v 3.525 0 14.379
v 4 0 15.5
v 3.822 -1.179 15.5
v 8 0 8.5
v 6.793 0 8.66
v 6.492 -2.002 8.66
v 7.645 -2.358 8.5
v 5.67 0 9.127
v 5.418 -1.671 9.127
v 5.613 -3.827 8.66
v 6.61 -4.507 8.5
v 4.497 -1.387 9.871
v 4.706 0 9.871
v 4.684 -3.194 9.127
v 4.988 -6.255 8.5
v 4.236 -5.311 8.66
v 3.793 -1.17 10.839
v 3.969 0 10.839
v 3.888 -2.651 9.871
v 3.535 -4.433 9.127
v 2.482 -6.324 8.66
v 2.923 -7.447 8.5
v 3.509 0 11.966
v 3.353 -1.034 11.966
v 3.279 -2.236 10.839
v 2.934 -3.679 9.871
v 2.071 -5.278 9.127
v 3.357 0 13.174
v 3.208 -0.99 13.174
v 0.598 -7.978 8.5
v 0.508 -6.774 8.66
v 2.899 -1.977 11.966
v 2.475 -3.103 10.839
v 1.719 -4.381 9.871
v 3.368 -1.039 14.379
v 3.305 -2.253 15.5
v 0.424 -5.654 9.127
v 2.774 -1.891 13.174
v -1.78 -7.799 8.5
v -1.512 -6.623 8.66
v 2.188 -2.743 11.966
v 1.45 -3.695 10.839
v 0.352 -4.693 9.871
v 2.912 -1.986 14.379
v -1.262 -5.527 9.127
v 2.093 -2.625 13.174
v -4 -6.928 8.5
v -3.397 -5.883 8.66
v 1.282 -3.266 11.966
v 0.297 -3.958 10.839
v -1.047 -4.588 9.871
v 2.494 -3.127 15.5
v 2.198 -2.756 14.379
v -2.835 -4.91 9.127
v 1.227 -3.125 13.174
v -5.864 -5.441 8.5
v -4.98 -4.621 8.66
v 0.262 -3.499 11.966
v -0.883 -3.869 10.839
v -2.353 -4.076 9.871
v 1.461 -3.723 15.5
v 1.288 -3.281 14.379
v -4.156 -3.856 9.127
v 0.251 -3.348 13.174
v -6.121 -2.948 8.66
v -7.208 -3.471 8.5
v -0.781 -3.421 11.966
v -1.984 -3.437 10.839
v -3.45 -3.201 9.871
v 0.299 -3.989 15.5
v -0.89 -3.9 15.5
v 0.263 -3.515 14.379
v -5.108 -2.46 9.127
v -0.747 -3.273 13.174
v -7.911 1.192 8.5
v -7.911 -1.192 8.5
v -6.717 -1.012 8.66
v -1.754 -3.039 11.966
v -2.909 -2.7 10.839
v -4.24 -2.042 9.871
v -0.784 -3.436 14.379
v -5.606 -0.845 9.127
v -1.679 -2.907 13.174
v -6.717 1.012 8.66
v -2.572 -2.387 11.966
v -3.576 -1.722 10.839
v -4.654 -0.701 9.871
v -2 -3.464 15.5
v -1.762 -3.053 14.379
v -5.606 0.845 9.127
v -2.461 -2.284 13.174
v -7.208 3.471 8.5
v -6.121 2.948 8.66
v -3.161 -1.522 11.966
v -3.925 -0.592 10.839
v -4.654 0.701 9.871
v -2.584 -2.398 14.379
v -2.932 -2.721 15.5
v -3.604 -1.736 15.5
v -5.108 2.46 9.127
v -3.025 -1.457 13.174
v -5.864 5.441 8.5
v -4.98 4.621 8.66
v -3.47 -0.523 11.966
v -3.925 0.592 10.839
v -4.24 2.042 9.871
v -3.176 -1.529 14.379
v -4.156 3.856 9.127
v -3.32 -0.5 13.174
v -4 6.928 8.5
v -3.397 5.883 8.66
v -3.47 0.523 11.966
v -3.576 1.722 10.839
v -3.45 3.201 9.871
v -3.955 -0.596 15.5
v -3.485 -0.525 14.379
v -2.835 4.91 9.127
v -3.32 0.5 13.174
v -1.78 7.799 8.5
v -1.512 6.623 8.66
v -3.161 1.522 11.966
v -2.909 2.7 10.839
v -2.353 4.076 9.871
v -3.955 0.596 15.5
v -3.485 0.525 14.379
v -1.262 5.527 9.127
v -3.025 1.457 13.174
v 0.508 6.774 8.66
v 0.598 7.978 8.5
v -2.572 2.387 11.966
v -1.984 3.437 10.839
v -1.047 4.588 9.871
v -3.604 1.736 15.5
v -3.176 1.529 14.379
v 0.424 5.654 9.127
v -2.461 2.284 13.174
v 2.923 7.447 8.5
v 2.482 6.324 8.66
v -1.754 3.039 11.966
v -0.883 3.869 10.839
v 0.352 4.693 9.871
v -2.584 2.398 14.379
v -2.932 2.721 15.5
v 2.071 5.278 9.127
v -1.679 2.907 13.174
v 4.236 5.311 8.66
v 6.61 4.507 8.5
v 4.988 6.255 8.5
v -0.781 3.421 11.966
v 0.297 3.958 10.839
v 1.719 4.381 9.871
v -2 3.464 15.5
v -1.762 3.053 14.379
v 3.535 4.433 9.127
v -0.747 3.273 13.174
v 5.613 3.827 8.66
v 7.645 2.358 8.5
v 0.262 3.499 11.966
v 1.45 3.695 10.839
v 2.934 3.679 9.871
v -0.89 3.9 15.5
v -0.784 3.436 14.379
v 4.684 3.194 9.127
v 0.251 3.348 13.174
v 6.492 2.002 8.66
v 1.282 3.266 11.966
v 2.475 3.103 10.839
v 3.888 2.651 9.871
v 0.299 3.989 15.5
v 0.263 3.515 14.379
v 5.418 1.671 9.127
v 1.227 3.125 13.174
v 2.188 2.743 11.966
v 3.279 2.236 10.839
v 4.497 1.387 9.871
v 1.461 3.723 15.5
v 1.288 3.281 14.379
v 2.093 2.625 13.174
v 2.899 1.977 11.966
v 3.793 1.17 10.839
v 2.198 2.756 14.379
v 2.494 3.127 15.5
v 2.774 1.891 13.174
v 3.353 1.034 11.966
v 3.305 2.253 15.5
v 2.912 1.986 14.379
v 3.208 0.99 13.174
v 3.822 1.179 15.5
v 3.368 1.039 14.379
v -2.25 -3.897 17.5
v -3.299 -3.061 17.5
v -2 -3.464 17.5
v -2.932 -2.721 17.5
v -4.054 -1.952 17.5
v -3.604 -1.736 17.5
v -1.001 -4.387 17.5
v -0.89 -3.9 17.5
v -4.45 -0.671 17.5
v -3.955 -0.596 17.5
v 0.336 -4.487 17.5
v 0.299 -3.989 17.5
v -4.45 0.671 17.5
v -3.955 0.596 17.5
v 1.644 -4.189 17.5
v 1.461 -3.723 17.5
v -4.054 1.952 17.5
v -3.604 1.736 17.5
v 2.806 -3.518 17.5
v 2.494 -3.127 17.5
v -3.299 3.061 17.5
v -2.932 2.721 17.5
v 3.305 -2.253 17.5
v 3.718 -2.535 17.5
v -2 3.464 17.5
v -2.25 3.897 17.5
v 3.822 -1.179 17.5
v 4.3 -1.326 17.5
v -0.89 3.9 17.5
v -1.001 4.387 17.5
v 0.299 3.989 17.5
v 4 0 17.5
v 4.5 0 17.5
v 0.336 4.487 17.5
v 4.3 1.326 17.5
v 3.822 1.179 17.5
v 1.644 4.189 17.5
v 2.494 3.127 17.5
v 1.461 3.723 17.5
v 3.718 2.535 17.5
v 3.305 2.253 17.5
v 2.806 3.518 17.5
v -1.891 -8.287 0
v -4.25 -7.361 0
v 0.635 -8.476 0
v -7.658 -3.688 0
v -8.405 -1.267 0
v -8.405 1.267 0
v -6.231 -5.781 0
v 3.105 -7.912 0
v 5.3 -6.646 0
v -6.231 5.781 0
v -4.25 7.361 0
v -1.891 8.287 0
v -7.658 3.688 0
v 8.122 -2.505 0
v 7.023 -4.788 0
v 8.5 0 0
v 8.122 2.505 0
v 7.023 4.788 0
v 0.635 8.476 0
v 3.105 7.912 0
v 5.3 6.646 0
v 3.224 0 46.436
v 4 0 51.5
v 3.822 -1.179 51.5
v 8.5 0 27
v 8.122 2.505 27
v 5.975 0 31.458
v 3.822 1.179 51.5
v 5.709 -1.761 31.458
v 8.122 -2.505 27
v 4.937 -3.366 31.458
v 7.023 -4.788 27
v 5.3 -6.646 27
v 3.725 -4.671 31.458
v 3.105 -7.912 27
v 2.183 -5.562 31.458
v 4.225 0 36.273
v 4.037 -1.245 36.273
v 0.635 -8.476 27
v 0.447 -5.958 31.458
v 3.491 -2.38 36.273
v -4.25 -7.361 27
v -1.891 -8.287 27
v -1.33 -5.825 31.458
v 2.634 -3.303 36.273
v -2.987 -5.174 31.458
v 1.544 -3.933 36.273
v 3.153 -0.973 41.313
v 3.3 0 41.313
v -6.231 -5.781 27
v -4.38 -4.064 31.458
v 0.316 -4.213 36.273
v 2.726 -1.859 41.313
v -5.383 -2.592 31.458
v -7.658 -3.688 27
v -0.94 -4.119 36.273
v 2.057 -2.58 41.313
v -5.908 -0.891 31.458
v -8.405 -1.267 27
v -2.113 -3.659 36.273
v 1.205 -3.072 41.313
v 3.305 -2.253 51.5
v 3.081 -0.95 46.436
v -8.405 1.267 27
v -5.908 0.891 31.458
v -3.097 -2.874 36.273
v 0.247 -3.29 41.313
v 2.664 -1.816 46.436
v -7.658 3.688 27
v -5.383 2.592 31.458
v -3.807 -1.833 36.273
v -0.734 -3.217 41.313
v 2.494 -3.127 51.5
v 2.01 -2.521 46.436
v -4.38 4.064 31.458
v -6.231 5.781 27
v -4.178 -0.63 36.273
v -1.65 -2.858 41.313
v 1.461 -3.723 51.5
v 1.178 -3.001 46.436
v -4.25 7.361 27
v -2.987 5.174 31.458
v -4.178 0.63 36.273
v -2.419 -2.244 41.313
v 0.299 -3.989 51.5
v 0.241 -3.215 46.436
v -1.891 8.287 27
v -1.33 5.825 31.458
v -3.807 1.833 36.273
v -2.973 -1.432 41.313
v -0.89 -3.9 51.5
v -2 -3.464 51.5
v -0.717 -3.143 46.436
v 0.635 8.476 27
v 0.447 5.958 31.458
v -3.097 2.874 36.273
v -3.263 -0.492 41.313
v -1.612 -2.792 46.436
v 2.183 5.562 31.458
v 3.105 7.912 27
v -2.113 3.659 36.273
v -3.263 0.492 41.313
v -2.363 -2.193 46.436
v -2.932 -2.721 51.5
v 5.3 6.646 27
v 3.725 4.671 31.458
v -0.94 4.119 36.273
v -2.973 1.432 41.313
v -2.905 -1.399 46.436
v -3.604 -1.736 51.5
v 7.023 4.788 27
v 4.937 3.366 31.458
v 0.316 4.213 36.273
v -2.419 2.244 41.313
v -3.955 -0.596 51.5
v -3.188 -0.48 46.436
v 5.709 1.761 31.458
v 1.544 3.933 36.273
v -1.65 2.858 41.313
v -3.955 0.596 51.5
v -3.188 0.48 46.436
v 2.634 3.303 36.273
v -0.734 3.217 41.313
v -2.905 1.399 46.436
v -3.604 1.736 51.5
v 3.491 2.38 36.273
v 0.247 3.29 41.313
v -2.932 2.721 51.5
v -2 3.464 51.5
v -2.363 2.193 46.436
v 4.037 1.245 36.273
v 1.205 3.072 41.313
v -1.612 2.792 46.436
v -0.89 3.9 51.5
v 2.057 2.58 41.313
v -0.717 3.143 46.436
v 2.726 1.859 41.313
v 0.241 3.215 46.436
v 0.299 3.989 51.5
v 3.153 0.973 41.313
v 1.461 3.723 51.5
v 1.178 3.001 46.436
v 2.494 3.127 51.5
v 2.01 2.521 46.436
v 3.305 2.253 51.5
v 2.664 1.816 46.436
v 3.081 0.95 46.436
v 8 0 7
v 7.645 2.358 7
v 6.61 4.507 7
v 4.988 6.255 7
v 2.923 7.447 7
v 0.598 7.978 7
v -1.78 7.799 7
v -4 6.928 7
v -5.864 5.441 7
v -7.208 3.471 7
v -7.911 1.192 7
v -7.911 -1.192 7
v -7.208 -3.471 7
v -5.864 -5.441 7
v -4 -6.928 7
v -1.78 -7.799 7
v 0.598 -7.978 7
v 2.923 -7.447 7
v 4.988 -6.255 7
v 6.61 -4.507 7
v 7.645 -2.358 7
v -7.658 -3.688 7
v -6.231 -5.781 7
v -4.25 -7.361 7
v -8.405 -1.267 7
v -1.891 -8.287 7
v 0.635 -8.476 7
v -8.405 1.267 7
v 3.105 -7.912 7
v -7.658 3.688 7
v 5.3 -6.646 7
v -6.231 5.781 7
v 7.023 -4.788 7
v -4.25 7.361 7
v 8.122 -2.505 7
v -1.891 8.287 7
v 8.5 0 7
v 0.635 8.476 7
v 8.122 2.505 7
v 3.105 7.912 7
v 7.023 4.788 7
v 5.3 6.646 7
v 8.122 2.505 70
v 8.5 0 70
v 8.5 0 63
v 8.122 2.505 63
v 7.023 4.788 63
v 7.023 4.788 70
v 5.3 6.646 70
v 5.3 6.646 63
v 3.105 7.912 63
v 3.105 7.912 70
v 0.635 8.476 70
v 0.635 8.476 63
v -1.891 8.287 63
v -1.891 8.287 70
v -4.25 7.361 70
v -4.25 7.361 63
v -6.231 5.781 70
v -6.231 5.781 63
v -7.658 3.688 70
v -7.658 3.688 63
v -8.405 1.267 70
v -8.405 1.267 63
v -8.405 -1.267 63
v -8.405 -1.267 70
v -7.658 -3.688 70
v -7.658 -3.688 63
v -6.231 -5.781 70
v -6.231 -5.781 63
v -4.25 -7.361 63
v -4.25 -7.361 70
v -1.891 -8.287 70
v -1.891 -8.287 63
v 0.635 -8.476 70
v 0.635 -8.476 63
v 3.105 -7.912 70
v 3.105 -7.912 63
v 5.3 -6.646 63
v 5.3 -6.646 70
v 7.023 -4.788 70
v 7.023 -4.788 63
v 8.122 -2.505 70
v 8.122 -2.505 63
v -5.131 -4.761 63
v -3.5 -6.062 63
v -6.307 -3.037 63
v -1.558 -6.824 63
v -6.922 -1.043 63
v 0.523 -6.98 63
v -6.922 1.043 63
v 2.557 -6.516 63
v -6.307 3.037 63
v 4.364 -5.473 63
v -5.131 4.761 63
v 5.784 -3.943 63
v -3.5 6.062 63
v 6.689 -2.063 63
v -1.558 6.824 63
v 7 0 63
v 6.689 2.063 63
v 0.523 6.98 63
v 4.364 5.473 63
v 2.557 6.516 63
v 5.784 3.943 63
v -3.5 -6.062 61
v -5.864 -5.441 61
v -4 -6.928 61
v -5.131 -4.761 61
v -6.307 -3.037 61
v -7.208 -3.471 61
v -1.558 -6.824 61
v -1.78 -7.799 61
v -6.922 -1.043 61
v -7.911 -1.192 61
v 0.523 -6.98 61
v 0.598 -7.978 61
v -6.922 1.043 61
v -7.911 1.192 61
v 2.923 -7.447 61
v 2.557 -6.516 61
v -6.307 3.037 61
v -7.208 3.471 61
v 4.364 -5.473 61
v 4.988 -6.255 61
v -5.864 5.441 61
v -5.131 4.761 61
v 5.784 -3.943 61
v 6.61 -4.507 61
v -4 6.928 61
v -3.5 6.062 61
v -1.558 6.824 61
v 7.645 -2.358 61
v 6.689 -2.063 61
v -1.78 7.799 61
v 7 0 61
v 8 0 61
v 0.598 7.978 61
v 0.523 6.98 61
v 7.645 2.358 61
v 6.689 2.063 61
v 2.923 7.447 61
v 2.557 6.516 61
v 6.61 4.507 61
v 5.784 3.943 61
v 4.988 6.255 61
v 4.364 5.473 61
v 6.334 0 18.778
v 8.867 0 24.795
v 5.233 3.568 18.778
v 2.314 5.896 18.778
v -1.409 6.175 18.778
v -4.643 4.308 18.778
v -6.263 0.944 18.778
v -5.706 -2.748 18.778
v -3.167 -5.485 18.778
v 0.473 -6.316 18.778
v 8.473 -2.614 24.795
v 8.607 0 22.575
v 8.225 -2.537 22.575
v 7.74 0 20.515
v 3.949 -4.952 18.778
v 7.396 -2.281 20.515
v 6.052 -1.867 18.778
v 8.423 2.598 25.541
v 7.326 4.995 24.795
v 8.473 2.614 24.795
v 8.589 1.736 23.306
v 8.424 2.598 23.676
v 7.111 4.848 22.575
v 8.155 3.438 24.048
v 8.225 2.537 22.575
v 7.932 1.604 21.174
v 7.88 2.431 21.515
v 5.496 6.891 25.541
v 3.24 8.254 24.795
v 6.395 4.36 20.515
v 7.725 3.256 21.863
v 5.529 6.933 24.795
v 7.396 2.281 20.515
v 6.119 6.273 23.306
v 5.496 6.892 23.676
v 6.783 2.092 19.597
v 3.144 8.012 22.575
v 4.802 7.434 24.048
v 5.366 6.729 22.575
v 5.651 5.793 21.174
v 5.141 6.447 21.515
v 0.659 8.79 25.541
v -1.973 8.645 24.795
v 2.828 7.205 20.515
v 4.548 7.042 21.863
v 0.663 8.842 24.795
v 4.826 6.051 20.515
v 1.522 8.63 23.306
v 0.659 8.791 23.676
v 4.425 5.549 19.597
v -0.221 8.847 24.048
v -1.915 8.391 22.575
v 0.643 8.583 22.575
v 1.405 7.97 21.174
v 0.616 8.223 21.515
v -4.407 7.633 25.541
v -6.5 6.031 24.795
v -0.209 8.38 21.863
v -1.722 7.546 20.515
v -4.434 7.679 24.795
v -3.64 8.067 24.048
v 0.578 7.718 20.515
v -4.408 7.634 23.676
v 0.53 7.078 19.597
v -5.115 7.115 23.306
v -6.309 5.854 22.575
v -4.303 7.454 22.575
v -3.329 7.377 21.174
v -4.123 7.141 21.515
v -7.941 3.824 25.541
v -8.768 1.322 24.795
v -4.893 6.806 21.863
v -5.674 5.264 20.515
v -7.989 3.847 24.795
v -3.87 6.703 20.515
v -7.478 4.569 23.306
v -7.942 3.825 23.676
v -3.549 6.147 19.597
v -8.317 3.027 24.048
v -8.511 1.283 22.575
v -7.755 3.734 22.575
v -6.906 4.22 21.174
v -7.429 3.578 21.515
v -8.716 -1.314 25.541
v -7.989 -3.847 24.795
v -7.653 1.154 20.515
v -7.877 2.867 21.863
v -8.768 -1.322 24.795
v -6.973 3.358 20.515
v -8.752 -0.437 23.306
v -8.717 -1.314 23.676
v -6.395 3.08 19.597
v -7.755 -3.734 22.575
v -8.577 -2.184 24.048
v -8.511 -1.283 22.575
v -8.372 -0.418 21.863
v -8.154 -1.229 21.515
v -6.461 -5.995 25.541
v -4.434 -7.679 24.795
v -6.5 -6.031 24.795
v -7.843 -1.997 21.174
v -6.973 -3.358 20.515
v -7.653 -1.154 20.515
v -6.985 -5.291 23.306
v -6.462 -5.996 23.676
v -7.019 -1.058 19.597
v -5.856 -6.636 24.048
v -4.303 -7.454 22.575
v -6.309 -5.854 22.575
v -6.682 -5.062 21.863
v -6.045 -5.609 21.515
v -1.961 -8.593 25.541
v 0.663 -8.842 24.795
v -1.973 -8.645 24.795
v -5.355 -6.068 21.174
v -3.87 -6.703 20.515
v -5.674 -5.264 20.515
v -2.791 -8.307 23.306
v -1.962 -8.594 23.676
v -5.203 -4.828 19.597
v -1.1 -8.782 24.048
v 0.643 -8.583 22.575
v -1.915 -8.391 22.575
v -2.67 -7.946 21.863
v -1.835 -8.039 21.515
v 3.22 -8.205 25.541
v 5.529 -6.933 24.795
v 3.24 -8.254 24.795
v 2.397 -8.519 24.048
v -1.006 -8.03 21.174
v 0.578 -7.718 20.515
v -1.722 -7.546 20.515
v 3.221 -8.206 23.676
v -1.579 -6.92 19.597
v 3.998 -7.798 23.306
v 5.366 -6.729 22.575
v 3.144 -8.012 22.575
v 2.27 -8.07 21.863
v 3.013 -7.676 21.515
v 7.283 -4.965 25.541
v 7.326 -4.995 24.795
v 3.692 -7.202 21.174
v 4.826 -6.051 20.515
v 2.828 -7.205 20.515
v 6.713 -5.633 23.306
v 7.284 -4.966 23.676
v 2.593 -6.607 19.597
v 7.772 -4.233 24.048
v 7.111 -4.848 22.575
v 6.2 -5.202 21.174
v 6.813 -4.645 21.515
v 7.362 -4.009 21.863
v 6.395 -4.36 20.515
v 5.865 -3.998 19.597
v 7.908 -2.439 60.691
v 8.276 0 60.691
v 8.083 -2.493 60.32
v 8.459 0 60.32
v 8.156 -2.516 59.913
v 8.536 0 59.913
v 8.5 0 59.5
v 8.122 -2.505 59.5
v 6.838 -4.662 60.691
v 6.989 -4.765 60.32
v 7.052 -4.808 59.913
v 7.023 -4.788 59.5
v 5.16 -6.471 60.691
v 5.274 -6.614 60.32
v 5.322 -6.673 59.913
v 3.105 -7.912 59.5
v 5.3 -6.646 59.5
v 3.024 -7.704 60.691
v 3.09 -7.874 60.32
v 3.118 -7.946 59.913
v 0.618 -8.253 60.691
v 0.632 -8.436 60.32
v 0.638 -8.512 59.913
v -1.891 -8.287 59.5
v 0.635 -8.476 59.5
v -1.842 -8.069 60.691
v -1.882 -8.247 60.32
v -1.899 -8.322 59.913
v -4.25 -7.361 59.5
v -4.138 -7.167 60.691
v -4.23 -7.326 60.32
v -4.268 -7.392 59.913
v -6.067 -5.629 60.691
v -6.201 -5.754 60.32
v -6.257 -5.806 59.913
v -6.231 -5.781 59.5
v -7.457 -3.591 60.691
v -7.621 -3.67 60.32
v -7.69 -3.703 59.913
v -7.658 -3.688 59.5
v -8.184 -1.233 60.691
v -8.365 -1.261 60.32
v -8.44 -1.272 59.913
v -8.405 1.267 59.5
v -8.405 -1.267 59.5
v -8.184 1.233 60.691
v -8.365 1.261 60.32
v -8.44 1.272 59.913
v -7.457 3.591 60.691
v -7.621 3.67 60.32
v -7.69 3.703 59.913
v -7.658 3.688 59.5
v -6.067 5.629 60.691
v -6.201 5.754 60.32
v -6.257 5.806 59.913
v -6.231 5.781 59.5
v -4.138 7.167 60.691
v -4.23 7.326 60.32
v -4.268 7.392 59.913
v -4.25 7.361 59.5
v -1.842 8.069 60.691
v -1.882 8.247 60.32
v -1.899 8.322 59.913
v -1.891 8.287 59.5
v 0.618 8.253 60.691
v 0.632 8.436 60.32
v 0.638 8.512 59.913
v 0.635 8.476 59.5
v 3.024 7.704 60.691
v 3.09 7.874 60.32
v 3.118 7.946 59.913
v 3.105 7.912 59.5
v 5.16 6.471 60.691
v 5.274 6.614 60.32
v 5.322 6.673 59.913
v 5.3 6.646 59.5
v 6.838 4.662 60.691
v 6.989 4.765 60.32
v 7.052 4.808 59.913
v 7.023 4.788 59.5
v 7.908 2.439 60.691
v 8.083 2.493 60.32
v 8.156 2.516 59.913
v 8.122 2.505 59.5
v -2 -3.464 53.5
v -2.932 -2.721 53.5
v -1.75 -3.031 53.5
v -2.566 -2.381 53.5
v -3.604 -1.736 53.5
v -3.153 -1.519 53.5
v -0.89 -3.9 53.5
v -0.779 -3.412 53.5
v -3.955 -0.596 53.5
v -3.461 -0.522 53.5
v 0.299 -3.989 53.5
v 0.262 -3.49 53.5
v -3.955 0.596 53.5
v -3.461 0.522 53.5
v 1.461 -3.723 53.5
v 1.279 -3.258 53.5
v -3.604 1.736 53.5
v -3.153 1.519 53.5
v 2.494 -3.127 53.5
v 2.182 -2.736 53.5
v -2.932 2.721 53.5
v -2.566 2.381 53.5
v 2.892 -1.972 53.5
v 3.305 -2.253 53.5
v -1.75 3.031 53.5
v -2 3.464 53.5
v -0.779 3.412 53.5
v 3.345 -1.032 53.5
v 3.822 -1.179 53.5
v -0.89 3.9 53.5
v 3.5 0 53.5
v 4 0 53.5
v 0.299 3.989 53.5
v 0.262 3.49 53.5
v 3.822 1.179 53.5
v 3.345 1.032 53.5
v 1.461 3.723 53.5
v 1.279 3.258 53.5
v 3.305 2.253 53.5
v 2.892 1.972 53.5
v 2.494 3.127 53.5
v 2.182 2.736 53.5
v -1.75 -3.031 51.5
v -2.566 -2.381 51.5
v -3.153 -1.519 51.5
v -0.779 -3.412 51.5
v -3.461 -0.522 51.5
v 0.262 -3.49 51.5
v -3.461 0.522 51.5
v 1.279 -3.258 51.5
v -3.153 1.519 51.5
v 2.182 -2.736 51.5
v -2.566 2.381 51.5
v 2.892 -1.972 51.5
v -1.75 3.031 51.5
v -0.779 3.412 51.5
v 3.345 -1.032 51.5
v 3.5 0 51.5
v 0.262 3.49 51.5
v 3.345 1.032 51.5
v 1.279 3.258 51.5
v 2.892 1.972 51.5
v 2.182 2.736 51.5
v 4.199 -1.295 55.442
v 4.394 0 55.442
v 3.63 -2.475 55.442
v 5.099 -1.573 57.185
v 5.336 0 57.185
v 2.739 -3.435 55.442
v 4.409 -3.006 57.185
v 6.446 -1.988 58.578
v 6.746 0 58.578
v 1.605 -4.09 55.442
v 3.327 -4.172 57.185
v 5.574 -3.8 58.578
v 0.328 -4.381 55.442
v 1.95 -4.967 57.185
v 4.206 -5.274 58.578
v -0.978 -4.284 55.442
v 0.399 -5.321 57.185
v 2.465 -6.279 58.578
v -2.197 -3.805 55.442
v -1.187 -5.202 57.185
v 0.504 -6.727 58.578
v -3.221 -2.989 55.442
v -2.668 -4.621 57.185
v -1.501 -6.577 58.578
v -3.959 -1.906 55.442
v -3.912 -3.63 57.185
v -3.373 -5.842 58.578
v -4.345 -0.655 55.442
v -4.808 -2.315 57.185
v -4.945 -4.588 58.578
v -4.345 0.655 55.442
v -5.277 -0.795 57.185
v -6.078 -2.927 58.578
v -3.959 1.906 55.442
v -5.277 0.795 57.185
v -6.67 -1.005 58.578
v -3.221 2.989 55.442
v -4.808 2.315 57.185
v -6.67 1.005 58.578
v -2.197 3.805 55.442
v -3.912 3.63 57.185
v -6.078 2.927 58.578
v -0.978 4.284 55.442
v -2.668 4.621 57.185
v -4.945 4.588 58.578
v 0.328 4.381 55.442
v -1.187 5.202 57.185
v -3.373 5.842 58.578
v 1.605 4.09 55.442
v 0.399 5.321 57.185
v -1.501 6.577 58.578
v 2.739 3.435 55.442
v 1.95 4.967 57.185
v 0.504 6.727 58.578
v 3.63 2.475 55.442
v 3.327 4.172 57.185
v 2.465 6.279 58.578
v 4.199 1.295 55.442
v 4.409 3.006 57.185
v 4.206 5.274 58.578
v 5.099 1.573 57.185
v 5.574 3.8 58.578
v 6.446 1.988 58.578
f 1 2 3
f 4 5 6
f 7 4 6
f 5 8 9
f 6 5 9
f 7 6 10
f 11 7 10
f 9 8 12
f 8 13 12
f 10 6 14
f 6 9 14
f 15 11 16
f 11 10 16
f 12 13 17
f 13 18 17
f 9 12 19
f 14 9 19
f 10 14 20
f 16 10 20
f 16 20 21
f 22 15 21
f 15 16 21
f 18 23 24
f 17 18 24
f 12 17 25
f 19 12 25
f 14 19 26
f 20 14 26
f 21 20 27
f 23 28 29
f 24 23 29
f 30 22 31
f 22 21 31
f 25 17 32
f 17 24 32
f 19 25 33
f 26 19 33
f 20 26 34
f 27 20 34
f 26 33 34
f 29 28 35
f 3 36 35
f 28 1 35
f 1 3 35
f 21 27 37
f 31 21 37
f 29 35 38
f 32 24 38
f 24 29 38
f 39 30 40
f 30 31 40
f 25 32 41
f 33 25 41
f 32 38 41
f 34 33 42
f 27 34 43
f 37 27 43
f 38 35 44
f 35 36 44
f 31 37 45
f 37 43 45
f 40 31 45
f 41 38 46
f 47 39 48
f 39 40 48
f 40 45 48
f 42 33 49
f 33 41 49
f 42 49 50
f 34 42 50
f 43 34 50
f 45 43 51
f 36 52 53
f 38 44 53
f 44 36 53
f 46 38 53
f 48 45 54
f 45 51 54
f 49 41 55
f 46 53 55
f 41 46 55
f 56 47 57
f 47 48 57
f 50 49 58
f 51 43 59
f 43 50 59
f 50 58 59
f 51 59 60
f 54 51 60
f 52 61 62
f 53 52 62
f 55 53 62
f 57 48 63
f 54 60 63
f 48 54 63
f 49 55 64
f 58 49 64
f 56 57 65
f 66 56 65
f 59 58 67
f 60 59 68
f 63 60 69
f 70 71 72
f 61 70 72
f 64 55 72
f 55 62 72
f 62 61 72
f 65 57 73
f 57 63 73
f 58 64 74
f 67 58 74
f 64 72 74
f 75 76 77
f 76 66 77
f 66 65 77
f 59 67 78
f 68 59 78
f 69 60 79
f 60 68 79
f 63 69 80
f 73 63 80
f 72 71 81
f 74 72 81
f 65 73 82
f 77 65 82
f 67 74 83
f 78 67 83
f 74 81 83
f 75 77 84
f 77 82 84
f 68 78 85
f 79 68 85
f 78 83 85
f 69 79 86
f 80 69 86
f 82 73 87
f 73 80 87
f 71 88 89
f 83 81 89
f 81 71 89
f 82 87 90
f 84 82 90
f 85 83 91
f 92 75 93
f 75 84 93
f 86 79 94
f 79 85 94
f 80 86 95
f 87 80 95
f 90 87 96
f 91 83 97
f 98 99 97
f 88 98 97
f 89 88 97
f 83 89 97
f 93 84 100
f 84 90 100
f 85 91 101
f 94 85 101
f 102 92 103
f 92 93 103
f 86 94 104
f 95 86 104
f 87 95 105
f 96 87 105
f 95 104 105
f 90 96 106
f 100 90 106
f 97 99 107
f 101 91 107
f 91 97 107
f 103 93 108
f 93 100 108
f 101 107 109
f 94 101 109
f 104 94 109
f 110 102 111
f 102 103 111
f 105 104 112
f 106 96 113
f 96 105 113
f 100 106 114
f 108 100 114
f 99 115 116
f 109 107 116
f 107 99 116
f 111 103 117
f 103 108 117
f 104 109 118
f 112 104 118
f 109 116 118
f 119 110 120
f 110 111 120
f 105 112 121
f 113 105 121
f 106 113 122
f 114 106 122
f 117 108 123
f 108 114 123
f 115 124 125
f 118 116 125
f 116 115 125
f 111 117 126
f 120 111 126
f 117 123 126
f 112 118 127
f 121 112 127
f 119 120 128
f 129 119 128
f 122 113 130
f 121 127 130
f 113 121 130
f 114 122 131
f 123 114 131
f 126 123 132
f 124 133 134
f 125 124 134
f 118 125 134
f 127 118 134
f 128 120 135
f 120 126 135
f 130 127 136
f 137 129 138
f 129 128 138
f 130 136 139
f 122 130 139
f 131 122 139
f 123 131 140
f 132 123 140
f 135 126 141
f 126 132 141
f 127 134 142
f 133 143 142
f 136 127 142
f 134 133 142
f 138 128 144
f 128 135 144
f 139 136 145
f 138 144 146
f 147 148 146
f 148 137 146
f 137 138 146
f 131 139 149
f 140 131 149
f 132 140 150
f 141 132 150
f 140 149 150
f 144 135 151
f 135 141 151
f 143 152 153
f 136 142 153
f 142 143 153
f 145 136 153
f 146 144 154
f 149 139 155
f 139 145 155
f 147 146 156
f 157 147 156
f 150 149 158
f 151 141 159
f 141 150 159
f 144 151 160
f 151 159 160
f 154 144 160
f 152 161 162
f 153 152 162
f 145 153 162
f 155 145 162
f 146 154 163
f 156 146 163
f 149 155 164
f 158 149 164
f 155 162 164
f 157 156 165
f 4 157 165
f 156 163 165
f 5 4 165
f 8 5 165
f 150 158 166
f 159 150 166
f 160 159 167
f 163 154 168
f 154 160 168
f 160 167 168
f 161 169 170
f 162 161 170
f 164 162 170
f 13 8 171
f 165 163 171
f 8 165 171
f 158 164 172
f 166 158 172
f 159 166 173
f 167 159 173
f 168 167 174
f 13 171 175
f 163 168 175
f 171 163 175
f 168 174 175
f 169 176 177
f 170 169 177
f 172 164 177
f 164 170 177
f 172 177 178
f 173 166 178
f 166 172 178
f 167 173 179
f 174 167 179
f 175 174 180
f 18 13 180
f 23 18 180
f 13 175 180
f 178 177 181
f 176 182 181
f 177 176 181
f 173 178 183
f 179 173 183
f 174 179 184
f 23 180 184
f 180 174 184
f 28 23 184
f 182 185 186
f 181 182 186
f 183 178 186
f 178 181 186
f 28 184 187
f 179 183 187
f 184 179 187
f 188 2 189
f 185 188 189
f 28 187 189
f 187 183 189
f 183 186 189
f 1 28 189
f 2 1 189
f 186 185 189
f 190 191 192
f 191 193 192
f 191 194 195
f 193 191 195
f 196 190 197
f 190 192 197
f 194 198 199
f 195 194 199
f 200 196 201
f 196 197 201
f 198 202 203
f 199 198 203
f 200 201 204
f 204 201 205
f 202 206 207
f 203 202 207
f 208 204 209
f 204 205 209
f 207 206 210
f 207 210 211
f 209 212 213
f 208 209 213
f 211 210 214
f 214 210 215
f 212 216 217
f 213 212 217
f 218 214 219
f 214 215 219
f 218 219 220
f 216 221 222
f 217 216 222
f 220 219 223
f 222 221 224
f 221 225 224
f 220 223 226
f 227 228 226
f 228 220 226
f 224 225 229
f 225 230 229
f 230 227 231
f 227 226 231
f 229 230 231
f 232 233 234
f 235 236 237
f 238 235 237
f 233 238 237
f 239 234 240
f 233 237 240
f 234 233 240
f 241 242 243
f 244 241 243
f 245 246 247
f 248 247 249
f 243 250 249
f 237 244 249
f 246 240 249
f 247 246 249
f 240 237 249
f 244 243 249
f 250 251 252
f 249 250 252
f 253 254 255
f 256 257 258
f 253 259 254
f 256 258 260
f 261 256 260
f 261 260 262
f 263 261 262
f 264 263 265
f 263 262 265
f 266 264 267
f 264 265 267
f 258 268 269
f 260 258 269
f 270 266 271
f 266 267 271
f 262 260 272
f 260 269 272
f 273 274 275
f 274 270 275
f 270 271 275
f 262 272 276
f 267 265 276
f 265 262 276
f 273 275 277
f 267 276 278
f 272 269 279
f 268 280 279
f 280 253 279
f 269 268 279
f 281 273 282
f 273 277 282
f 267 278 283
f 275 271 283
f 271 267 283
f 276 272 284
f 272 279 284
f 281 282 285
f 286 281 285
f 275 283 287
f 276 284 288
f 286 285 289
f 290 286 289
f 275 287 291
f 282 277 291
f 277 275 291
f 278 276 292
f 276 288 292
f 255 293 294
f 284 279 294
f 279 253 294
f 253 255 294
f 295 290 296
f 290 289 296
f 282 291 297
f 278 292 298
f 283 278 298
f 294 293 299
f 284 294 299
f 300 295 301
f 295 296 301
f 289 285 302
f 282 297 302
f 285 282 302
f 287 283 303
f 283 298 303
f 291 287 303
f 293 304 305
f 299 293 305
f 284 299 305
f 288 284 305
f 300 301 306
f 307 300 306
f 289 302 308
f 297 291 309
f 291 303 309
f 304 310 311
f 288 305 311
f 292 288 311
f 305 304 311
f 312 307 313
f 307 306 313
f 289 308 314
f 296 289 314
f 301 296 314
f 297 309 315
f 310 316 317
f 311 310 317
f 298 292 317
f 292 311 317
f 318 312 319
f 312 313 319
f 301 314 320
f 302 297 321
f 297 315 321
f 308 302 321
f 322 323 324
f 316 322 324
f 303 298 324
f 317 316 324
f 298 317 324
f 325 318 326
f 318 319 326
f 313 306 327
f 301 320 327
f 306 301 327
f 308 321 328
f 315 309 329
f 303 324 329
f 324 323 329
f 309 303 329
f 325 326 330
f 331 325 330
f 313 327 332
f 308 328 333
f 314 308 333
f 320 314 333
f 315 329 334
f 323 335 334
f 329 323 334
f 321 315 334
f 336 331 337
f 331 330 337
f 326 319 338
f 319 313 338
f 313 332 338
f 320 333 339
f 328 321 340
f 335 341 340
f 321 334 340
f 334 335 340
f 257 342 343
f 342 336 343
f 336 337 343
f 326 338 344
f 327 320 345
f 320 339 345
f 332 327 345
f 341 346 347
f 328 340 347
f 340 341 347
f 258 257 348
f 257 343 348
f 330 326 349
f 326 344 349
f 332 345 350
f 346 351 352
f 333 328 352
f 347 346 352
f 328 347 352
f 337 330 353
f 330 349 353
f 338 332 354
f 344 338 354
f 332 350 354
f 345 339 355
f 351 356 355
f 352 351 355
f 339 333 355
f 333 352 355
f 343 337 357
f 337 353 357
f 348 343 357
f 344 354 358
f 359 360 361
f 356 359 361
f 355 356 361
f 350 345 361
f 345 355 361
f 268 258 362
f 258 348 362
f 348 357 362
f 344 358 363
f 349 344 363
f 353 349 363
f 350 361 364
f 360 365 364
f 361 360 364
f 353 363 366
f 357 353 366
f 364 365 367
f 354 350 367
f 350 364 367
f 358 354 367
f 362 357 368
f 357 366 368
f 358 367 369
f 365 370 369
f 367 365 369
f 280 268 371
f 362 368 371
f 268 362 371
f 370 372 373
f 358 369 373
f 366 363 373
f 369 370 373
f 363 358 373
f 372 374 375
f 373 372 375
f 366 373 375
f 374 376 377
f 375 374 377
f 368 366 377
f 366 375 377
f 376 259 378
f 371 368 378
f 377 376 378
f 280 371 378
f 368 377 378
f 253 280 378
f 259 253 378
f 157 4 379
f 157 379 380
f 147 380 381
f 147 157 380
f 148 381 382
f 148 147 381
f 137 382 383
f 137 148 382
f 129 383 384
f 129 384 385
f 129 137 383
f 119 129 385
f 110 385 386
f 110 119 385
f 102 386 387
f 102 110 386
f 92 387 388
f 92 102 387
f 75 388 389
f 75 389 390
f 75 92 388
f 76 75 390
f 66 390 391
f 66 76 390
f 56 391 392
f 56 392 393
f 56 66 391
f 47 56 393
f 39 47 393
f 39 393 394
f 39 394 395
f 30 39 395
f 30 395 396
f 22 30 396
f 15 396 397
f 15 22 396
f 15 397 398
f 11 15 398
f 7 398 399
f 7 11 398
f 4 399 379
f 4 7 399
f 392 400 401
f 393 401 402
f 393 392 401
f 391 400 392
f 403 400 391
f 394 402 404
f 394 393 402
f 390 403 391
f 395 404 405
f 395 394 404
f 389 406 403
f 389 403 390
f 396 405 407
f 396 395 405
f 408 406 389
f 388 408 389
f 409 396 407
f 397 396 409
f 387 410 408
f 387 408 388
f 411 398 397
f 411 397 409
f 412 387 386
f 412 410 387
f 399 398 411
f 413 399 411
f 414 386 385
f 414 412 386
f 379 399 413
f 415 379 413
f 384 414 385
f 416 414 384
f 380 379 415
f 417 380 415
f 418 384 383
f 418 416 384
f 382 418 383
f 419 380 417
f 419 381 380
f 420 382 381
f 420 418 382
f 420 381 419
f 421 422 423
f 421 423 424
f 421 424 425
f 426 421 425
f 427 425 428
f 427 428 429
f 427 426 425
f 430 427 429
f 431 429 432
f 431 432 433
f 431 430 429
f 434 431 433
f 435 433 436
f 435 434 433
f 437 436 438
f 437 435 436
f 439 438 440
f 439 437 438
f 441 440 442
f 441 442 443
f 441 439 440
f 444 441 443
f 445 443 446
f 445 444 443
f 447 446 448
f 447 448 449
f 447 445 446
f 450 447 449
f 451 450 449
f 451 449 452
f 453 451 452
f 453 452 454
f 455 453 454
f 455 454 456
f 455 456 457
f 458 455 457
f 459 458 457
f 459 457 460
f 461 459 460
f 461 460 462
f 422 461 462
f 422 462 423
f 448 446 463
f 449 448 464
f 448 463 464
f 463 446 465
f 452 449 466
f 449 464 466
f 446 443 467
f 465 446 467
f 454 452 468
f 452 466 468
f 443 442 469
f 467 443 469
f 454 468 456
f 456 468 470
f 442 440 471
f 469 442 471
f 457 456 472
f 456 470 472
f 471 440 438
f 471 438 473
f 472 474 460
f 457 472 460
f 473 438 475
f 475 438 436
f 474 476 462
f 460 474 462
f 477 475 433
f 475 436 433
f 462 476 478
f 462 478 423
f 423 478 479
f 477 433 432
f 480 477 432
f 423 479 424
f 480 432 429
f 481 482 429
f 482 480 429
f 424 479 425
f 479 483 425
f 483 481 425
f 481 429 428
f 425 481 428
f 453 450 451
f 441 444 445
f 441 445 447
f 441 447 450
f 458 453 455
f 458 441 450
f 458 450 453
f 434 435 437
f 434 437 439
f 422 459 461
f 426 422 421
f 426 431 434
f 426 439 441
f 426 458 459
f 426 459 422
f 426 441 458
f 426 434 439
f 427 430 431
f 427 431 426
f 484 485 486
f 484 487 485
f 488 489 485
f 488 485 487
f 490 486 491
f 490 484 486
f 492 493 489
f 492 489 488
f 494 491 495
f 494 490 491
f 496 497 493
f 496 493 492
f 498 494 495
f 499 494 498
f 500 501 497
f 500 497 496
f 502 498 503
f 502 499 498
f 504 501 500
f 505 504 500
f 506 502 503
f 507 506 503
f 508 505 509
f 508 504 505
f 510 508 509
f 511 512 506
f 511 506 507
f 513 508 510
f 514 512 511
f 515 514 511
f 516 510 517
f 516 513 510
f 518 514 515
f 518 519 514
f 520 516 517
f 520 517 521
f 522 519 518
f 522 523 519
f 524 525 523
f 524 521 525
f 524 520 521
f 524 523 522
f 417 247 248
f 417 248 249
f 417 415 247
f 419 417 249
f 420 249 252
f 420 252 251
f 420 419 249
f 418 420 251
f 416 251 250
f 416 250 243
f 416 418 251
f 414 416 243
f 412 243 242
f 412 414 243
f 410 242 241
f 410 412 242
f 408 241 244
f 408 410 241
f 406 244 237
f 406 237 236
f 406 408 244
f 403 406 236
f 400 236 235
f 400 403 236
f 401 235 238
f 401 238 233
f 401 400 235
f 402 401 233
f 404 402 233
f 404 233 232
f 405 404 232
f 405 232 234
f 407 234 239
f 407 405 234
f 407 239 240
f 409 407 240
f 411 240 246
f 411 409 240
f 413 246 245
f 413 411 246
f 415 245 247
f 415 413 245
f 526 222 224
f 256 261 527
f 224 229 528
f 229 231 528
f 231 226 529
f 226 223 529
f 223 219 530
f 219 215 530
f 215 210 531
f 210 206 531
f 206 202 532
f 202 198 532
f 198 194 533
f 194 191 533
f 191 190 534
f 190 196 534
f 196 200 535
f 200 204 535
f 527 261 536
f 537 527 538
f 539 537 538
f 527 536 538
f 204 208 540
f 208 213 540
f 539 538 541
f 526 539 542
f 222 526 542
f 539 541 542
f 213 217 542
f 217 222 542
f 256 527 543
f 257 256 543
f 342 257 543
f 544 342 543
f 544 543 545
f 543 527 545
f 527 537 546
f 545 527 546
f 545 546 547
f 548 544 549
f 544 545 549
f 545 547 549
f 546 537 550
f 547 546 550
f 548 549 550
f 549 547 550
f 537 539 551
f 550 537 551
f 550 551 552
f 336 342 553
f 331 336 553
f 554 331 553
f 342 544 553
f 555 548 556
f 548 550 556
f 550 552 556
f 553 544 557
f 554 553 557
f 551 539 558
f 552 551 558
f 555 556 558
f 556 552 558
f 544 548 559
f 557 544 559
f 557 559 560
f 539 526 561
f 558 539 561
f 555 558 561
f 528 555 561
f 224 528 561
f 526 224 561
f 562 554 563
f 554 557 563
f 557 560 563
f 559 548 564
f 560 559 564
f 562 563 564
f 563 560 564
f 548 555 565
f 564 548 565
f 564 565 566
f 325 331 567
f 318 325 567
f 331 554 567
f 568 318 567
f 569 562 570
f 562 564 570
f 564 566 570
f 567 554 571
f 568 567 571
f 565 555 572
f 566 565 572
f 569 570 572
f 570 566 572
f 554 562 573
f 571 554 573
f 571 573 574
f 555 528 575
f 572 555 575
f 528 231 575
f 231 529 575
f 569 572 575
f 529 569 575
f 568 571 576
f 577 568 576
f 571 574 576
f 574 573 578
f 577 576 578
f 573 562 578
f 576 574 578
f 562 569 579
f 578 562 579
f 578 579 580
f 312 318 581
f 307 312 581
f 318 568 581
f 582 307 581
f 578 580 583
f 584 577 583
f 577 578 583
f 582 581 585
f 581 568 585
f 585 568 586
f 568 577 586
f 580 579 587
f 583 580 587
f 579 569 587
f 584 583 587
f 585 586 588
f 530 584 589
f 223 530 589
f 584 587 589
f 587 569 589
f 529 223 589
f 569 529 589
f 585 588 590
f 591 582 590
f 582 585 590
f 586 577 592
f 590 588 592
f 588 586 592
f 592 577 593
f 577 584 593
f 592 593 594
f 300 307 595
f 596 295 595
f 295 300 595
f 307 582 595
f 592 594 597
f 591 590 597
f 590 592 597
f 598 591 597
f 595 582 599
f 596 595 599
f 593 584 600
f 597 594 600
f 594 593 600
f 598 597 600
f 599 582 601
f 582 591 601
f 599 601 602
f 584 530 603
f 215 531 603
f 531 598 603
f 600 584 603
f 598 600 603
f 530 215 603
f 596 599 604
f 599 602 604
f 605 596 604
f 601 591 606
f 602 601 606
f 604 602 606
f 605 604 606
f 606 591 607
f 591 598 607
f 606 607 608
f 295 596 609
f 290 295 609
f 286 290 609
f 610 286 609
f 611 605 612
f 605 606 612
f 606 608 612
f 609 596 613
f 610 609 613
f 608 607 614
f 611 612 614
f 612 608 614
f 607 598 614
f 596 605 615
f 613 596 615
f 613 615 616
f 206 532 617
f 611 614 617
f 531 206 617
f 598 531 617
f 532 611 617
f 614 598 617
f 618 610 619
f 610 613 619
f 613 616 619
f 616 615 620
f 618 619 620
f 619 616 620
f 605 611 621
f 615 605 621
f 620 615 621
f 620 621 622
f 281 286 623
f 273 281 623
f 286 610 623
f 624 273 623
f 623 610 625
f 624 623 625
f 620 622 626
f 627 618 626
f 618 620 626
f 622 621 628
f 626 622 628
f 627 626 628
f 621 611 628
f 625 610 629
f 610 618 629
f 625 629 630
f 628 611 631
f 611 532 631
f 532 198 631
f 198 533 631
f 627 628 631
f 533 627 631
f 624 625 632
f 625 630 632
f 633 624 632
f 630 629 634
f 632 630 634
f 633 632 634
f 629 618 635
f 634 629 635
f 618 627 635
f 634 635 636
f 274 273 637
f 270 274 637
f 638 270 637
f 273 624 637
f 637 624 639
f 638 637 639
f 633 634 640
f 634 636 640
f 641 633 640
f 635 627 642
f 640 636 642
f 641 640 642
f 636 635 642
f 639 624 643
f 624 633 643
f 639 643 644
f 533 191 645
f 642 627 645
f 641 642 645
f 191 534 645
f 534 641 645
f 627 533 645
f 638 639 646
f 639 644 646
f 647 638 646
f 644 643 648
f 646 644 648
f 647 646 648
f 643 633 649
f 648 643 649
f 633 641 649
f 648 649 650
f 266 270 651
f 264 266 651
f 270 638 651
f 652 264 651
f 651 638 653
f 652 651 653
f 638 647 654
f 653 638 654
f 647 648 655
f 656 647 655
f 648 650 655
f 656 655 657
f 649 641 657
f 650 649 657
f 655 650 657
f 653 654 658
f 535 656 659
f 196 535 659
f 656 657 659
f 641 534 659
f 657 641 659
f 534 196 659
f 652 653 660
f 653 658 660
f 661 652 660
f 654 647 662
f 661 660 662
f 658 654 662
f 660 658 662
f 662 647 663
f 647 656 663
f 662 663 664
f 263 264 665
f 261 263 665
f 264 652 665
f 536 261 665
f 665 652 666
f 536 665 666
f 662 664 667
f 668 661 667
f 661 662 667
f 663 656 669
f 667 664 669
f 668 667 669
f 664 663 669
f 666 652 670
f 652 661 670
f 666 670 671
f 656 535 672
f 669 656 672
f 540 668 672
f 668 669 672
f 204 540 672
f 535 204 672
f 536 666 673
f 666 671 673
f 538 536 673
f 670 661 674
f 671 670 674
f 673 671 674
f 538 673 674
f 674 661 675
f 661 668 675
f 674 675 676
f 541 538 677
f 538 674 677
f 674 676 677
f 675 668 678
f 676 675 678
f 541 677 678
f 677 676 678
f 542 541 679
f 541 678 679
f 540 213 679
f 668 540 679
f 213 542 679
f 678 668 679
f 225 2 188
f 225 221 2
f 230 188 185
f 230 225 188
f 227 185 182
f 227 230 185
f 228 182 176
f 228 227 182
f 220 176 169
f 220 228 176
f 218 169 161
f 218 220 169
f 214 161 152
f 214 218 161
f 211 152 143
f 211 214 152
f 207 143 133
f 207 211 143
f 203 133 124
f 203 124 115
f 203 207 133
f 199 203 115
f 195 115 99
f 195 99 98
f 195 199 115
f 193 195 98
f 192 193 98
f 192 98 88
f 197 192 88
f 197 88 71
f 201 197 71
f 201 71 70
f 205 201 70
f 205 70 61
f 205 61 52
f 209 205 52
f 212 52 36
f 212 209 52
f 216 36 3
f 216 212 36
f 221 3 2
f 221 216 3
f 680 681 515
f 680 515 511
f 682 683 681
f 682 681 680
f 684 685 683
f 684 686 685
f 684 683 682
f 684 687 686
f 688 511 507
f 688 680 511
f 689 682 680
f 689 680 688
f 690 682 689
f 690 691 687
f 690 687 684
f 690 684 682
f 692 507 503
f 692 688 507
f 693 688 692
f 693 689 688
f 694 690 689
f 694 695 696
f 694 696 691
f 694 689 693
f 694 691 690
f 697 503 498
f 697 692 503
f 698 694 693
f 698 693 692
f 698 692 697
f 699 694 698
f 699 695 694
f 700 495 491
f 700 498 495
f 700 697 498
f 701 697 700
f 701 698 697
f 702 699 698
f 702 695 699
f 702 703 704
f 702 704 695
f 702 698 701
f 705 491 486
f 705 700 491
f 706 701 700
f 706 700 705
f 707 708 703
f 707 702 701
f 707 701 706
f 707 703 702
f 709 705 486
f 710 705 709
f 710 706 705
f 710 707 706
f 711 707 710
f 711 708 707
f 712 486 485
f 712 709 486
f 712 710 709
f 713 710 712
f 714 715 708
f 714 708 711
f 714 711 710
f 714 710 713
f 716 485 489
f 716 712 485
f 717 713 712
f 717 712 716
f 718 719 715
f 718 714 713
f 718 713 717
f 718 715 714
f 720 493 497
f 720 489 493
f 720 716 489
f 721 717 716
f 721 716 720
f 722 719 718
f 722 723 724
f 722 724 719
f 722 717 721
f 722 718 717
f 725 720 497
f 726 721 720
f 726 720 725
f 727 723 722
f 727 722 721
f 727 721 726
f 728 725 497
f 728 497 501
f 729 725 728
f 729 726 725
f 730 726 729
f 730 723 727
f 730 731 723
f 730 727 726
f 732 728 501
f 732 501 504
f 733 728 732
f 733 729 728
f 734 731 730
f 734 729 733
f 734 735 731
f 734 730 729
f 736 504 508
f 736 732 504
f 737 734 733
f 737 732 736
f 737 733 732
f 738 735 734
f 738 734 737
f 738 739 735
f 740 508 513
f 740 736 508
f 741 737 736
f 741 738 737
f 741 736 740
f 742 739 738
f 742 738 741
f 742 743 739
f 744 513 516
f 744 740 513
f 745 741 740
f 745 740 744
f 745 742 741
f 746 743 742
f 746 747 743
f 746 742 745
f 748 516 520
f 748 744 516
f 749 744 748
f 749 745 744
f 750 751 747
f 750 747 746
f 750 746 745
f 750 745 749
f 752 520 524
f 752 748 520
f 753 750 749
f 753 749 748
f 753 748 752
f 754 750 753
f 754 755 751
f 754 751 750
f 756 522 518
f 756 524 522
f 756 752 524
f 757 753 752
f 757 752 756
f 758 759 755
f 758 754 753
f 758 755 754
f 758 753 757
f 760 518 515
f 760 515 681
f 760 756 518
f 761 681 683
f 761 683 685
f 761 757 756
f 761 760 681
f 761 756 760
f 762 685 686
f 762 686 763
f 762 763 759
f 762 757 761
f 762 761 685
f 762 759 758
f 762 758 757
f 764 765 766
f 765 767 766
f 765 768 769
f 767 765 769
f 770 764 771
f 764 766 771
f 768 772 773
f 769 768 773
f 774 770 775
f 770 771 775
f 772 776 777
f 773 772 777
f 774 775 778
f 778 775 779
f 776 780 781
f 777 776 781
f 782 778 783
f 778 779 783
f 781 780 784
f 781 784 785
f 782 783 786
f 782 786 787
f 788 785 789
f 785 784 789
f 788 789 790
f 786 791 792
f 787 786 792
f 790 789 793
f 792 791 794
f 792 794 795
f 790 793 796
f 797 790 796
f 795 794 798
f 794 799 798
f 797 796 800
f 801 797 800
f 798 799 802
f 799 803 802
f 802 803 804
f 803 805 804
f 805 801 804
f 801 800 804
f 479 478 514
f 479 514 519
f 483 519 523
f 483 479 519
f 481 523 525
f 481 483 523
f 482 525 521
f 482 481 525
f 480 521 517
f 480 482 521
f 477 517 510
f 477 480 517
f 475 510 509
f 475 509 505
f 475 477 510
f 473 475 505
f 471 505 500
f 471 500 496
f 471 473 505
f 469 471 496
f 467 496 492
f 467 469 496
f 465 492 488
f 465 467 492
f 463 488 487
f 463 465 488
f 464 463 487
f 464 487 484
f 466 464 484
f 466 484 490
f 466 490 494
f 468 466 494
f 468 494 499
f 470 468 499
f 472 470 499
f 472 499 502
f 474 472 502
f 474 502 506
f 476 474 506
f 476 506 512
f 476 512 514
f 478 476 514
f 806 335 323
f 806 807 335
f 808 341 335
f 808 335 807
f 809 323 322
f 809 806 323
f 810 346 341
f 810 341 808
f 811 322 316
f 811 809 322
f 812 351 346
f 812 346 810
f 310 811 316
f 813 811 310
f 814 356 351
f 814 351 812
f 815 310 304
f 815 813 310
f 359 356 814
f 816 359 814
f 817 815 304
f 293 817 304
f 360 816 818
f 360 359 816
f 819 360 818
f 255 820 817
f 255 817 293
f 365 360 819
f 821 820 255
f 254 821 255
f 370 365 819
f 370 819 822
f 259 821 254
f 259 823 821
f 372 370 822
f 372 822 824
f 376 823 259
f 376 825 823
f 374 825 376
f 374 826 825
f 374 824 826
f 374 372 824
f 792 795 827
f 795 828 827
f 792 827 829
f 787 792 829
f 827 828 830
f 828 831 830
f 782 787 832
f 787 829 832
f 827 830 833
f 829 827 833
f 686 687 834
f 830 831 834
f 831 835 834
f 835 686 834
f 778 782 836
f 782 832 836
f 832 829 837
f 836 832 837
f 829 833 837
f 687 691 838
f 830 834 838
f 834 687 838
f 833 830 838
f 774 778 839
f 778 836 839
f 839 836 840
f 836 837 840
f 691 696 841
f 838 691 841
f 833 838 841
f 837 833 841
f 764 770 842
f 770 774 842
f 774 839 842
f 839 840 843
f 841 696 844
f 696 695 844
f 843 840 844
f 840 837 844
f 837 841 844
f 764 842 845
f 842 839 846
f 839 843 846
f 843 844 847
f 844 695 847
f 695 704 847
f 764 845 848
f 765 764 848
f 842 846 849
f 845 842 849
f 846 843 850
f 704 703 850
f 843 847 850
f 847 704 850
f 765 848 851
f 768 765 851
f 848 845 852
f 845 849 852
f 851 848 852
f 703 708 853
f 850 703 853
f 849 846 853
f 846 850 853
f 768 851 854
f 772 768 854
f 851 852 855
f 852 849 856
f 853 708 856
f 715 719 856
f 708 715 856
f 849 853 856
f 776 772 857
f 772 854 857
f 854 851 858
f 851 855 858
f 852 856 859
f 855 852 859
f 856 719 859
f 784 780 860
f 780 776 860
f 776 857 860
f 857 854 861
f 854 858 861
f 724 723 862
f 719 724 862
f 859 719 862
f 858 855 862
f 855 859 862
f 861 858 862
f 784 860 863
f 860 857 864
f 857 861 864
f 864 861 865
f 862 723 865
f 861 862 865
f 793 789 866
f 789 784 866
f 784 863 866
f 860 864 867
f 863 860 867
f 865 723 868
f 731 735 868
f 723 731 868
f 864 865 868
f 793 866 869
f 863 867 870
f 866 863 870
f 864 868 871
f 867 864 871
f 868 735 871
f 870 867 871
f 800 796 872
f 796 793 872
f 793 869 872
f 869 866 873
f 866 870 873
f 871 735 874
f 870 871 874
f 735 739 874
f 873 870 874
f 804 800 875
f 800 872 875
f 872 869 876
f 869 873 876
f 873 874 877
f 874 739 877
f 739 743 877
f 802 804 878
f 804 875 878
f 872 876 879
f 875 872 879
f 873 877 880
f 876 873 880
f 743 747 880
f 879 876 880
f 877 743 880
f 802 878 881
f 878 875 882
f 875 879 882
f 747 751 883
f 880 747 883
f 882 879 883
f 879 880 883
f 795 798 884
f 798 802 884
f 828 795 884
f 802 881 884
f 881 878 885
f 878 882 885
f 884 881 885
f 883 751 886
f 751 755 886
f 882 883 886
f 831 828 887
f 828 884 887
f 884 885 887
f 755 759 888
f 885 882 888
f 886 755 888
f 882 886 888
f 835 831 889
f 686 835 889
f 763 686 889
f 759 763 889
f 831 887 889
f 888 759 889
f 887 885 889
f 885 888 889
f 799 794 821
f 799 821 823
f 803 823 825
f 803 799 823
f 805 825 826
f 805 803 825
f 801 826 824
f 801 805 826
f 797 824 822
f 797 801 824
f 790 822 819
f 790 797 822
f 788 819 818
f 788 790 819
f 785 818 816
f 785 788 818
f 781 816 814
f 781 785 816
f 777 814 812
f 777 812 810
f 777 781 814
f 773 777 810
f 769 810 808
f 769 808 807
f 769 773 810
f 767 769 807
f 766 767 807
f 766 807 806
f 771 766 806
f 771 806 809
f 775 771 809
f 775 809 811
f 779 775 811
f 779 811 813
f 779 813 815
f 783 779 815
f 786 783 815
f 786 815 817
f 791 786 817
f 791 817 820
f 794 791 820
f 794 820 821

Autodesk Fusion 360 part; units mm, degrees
sketch "Sketch1" plane through (0, 0, 0) normal (0, 1, 0) x (1, 0, 0)
  line L0 (0, 0) -> (8.5, 0)
  line L1 (0, 0) -> (0, -70)
  line L2 (8.5, 0) -> (8.5, -7)
  line L3 (8.5, -7) -> (8, -7)
  line L4 (8, -7) -> (8, -8.5)
  line L5 (8.5, -7) -> (0, -7)
  line L6 (8, -8.5) -> (0, -8.5)
  line L7 (0, -8.5) -> (0, -15.5)
  line L8 (0, -15.5) -> (4, -15.5)
  arc A0 (8, -8.5) -> (4, -15.5) centre (8, -13.1429) ccw
  line L9 (4, -15.5) -> (4, -17.5)
  line L10 (4, -17.5) -> (0, -17.5)
  line L11 (0, -17.5) -> (4.5, -17.5)
  line L12 (0, -17.5) -> (0, -27)
  line L13 (0, -27) -> (8.5, -27)
  arc A1 (8.5, -27) -> (4.5, -17.5) centre (0.9117, -24.603) ccw
  line L14 (0, -27) -> (0, -51.5)
  line L15 (0, -51.5) -> (4, -51.5)
  arc A2 (8.5, -27) -> (4, -51.5) centre (33.8925, -44.3272) ccw
  line L16 (0, -51.5) -> (3.5, -51.5)
  line L17 (3.5, -51.5) -> (3.5, -53.5)
  line L18 (3.5, -53.5) -> (0, -53.5)
  line L19 (0, -53.5) -> (4, -53.5)
  line L20 (0, -53.5) -> (0, -59.5)
  line L21 (0, -59.5) -> (8.5, -59.5)
  arc A3 (4, -53.5) -> (8.5, -59.5) centre (10.7181, -53.1489) ccw
  line L22 (0, -59.5) -> (0, -61)
  line L23 (0, -61) -> (8, -61)
  line L24 (0, -61) -> (7, -61)
  line L25 (7, -61) -> (7, -63)
  line L26 (7, -63) -> (0, -63)
  line L27 (0, -63) -> (8.5, -63)
  line L28 (8.5, -63) -> (8.5, -70)
  line L29 (8.5, -70) -> (0, -70)
  arc A4 (8, -61) -> (8.5, -59.5) centre (7.0099, -59.8366) ccw
  dimension "d2" = 70
  dimension "d3" = 7
  dimension "d5" = 1.5
  dimension "d7" = 7
  dimension "d12" = 2
  dimension "d15" = 9.5
  dimension "d17" = 24.5
  dimension "d20" = 2
  dimension "d22" = 6
  dimension "d24" = 1.5
  dimension "d26" = 2
  dimension "d29" = 7
revolve "Revolve1" add sketch "Sketch1" angle 360 about axis through (0, 0, 0) along (0, 0, 1)
